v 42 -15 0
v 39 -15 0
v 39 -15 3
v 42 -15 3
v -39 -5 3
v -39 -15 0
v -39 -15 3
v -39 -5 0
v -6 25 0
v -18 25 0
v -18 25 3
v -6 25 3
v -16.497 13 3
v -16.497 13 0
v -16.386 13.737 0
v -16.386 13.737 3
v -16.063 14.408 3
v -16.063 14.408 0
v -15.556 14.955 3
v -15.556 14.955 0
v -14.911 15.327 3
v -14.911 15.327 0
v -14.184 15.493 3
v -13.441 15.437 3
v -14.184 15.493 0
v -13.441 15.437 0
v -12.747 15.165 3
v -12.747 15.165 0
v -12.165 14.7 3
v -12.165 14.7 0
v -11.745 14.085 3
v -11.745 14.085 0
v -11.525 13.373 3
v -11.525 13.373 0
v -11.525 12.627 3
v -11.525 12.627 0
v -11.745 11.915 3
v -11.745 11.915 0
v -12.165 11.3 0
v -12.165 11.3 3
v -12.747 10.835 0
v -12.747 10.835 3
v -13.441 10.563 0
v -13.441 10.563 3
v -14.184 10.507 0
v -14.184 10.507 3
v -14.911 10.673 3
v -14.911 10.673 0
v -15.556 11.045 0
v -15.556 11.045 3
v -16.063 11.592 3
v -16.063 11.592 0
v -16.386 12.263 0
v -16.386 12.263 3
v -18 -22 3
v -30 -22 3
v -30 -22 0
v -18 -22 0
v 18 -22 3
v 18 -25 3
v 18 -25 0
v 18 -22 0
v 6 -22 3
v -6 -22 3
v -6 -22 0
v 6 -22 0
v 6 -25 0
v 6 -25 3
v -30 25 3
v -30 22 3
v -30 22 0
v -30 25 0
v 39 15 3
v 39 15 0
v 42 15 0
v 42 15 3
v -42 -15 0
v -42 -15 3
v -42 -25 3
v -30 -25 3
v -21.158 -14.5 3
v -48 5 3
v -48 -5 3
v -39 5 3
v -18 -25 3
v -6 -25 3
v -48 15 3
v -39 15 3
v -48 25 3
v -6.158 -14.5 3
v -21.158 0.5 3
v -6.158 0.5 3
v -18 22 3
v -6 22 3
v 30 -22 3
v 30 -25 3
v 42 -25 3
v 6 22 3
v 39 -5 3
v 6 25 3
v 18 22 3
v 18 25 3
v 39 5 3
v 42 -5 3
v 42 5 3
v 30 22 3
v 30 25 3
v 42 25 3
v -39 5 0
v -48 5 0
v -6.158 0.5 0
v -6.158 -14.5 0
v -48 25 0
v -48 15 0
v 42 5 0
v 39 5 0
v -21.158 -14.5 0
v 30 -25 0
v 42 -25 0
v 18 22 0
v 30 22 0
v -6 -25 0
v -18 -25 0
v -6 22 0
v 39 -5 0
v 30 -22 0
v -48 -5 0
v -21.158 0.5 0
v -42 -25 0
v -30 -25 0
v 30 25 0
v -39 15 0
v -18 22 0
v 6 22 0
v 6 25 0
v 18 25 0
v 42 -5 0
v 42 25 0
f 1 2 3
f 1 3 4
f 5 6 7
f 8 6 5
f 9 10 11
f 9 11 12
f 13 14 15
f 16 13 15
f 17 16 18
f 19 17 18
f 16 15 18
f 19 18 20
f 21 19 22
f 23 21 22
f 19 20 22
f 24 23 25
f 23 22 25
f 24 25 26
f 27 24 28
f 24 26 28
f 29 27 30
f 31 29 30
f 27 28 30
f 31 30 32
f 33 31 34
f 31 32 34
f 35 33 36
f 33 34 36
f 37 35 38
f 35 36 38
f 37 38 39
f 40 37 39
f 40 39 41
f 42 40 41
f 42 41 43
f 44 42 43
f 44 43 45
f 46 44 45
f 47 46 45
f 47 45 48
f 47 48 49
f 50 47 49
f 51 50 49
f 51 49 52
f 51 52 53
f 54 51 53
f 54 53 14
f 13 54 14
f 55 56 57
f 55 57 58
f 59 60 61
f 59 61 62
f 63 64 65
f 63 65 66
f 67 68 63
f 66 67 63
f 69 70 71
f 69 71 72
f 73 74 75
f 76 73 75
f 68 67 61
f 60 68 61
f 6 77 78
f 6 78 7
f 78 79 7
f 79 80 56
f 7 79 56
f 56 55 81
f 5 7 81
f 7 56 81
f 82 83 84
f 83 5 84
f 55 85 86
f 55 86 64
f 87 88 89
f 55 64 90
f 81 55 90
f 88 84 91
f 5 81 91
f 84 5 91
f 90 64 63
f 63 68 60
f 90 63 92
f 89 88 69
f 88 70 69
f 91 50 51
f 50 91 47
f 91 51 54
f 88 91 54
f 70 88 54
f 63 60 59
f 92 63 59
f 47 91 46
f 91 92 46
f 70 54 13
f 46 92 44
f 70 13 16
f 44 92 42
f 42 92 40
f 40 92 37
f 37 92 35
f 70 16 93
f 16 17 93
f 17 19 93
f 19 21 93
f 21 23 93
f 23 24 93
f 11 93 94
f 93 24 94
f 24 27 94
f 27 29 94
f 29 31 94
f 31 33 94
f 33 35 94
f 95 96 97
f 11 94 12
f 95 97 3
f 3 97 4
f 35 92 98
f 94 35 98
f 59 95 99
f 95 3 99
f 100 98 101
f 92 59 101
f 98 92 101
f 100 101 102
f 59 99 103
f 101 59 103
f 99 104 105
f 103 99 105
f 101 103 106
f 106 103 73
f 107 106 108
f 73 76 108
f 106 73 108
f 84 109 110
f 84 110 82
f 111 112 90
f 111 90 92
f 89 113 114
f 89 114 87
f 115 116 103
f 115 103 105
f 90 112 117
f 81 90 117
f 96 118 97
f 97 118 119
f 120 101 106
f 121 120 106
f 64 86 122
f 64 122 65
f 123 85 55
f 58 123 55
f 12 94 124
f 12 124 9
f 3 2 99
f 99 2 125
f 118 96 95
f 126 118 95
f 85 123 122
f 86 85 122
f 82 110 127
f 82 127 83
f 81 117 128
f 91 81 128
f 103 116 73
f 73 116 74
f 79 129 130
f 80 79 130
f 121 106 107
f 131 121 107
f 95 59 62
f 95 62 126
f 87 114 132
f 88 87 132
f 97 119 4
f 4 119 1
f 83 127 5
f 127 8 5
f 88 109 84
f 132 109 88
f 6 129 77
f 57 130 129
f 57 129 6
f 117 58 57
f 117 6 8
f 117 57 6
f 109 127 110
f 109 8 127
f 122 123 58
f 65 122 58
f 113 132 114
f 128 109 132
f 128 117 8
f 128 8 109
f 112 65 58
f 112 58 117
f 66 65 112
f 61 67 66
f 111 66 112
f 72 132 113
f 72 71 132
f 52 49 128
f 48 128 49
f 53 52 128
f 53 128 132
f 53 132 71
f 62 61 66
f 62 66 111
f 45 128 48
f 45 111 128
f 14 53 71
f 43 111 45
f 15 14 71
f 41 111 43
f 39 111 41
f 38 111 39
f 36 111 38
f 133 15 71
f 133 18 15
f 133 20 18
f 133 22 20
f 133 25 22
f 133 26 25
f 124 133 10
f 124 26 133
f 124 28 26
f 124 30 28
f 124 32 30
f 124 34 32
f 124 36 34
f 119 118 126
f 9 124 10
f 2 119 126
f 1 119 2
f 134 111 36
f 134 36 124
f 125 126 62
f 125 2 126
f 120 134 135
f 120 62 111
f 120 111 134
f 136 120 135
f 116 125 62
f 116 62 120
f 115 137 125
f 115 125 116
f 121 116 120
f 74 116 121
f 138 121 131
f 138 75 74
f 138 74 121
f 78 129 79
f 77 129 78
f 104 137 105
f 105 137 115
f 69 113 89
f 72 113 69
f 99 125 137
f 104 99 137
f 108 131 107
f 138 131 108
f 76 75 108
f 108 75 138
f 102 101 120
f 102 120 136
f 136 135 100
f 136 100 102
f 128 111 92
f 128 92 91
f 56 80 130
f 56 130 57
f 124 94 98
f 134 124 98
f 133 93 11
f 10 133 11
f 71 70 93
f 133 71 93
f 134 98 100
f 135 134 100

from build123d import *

# Parameters (mm, degrees)
ESBO_O4_W                = 84
ESBO_O4_H                = 50
RESSALTO_EXTRUS_O2_DEPTH = 3
CORTE_EXTRUS_O2_REACH    = 50.969
ESBO_O5_W                = 12
ESBO_O5_H                = 3
CORTE_EXTRUS_O4_REACH    = 50.969
ESBO_O6_W                = 3
ESBO_O6_H                = 10
CORTE_EXTRUS_O5_REACH    = 50.969
ESBO_O8_R                = 2.5
ESBO_O8_W                = 15
ESBO_O8_H                = 15
ESBO_O11_W               = 3
ESBO_O11_H               = 10
RESSALTO_EXTRUS_O4_DEPTH = 6


with BuildPart() as part:
    # Esboço4 → Ressalto-extrusão2 (new body)
    with BuildSketch(Plane.XY):
        Rectangle(ESBO_O4_W, ESBO_O4_H)
    extrude(amount=RESSALTO_EXTRUS_O2_DEPTH)

    # Esboço5 → Corte-extrusão2 (cut, up to next)
    with BuildSketch(Plane.XY.offset(3), mode=Mode.PRIVATE) as corte_extrus_o2_sk1:
        with Locations((24, 23.5)):
            Rectangle(ESBO_O5_W, ESBO_O5_H)
    corte_extrus_o2_tool1 = extrude(corte_extrus_o2_sk1.sketch, amount=-CORTE_EXTRUS_O2_REACH, mode=Mode.PRIVATE) & part.part
    # Esboço5 → Corte-extrusão2 (cut, up to next)
    with BuildSketch(Plane.XY.offset(3), mode=Mode.PRIVATE) as corte_extrus_o2_sk2:
        with Locations((-24, 23.5)):
            Rectangle(ESBO_O5_W, ESBO_O5_H)
    corte_extrus_o2_tool2 = extrude(corte_extrus_o2_sk2.sketch, amount=-CORTE_EXTRUS_O2_REACH, mode=Mode.PRIVATE) & part.part
    # Esboço5 → Corte-extrusão2 (cut, up to next)
    with BuildSketch(Plane.XY.offset(3), mode=Mode.PRIVATE) as corte_extrus_o2_sk3:
        with Locations((0, 23.5)):
            Rectangle(ESBO_O5_W, ESBO_O5_H)
    corte_extrus_o2_tool3 = extrude(corte_extrus_o2_sk3.sketch, amount=-CORTE_EXTRUS_O2_REACH, mode=Mode.PRIVATE) & part.part
    # Esboço5 → Corte-extrusão2 (cut, up to next)
    with BuildSketch(Plane.XY.offset(3), mode=Mode.PRIVATE) as corte_extrus_o2_sk4:
        with Locations((0, -23.5)):
            Rectangle(ESBO_O5_W, ESBO_O5_H)
    corte_extrus_o2_tool4 = extrude(corte_extrus_o2_sk4.sketch, amount=-CORTE_EXTRUS_O2_REACH, mode=Mode.PRIVATE) & part.part
    # Esboço5 → Corte-extrusão2 (cut, up to next)
    with BuildSketch(Plane.XY.offset(3), mode=Mode.PRIVATE) as corte_extrus_o2_sk5:
        with Locations((-24, -23.5)):
            Rectangle(ESBO_O5_W, ESBO_O5_H)
    corte_extrus_o2_tool5 = extrude(corte_extrus_o2_sk5.sketch, amount=-CORTE_EXTRUS_O2_REACH, mode=Mode.PRIVATE) & part.part
    # Esboço5 → Corte-extrusão2 (cut, up to next)
    with BuildSketch(Plane.XY.offset(3), mode=Mode.PRIVATE) as corte_extrus_o2_sk6:
        with Locations((24, -23.5)):
            Rectangle(ESBO_O5_W, ESBO_O5_H)
    corte_extrus_o2_tool6 = extrude(corte_extrus_o2_sk6.sketch, amount=-CORTE_EXTRUS_O2_REACH, mode=Mode.PRIVATE) & part.part
    add(corte_extrus_o2_tool1.solids().sort_by_distance((24, 23.5, 3))[0], mode=Mode.SUBTRACT)
    add(corte_extrus_o2_tool2.solids().sort_by_distance((-24, 23.5, 3))[0], mode=Mode.SUBTRACT)
    add(corte_extrus_o2_tool3.solids().sort_by_distance((0, 23.5, 3))[0], mode=Mode.SUBTRACT)
    add(corte_extrus_o2_tool4.solids().sort_by_distance((0, -23.5, 3))[0], mode=Mode.SUBTRACT)
    add(corte_extrus_o2_tool5.solids().sort_by_distance((-24, -23.5, 3))[0], mode=Mode.SUBTRACT)
    add(corte_extrus_o2_tool6.solids().sort_by_distance((24, -23.5, 3))[0], mode=Mode.SUBTRACT)

    # Esboço6 → Corte-extrusão4 (cut, up to next)
    with BuildSketch(Plane.XY, mode=Mode.PRIVATE) as corte_extrus_o4_sk1:
        with Locations((40.5, 10)):
            Rectangle(ESBO_O6_W, ESBO_O6_H)
    corte_extrus_o4_tool1 = extrude(corte_extrus_o4_sk1.sketch, amount=CORTE_EXTRUS_O4_REACH, mode=Mode.PRIVATE) & part.part
    # Esboço6 → Corte-extrusão4 (cut, up to next)
    with BuildSketch(Plane.XY, mode=Mode.PRIVATE) as corte_extrus_o4_sk2:
        with Locations((-40.5, 10)):
            Rectangle(ESBO_O6_W, ESBO_O6_H)
    corte_extrus_o4_tool2 = extrude(corte_extrus_o4_sk2.sketch, amount=CORTE_EXTRUS_O4_REACH, mode=Mode.PRIVATE) & part.part
    # Esboço6 → Corte-extrusão4 (cut, up to next)
    with BuildSketch(Plane.XY, mode=Mode.PRIVATE) as corte_extrus_o4_sk3:
        with Locations((-40.5, -10)):
            Rectangle(ESBO_O6_W, ESBO_O6_H)
    corte_extrus_o4_tool3 = extrude(corte_extrus_o4_sk3.sketch, amount=CORTE_EXTRUS_O4_REACH, mode=Mode.PRIVATE) & part.part
    # Esboço6 → Corte-extrusão4 (cut, up to next)
    with BuildSketch(Plane.XY, mode=Mode.PRIVATE) as corte_extrus_o4_sk4:
        with Locations((40.5, -10)):
            Rectangle(ESBO_O6_W, ESBO_O6_H)
    corte_extrus_o4_tool4 = extrude(corte_extrus_o4_sk4.sketch, amount=CORTE_EXTRUS_O4_REACH, mode=Mode.PRIVATE) & part.part
    add(corte_extrus_o4_tool1.solids().sort_by_distance((40.5, 10, 0))[0], mode=Mode.SUBTRACT)
    add(corte_extrus_o4_tool2.solids().sort_by_distance((-40.5, 10, 0))[0], mode=Mode.SUBTRACT)
    add(corte_extrus_o4_tool3.solids().sort_by_distance((-40.5, -10, 0))[0], mode=Mode.SUBTRACT)
    add(corte_extrus_o4_tool4.solids().sort_by_distance((40.5, -10, 0))[0], mode=Mode.SUBTRACT)

    # Esboço8 → Corte-extrusão5 (cut, up to next)
    with BuildSketch(Plane(origin=(0, 0, 0), x_dir=(-1, 0, 0), z_dir=(0, 0, -1)), mode=Mode.PRIVATE) as corte_extrus_o5_sk1:
        with Locations((13.99726894, 13)):
            Circle(ESBO_O8_R)
    corte_extrus_o5_tool1 = extrude(corte_extrus_o5_sk1.sketch, amount=-CORTE_EXTRUS_O5_REACH, mode=Mode.PRIVATE) & part.part
    # Esboço8 → Corte-extrusão5 (cut, up to next)
    with BuildSketch(Plane(origin=(0, 0, 0), x_dir=(-1, 0, 0), z_dir=(0, 0, -1)), mode=Mode.PRIVATE) as corte_extrus_o5_sk2:
        with Locations((13.657630315, -7)):
            Rectangle(ESBO_O8_W, ESBO_O8_H)
    corte_extrus_o5_tool2 = extrude(corte_extrus_o5_sk2.sketch, amount=-CORTE_EXTRUS_O5_REACH, mode=Mode.PRIVATE) & part.part
    add(corte_extrus_o5_tool1.solids().sort_by_distance((-13.997269, 13, 0))[0], mode=Mode.SUBTRACT)
    add(corte_extrus_o5_tool2.solids().sort_by_distance((-13.65763, -7, 0))[0], mode=Mode.SUBTRACT)

    # Esboço11 → Ressalto-extrusão4 (add)
    with BuildSketch(Plane.ZY.offset(42)):
        with Locations((1.5, 0)):
            Rectangle(ESBO_O11_W, ESBO_O11_H)
        with Locations((1.5, 20)):
            Rectangle(ESBO_O11_W, ESBO_O11_H)
    extrude(amount=RESSALTO_EXTRUS_O4_DEPTH)


solid = part.part
